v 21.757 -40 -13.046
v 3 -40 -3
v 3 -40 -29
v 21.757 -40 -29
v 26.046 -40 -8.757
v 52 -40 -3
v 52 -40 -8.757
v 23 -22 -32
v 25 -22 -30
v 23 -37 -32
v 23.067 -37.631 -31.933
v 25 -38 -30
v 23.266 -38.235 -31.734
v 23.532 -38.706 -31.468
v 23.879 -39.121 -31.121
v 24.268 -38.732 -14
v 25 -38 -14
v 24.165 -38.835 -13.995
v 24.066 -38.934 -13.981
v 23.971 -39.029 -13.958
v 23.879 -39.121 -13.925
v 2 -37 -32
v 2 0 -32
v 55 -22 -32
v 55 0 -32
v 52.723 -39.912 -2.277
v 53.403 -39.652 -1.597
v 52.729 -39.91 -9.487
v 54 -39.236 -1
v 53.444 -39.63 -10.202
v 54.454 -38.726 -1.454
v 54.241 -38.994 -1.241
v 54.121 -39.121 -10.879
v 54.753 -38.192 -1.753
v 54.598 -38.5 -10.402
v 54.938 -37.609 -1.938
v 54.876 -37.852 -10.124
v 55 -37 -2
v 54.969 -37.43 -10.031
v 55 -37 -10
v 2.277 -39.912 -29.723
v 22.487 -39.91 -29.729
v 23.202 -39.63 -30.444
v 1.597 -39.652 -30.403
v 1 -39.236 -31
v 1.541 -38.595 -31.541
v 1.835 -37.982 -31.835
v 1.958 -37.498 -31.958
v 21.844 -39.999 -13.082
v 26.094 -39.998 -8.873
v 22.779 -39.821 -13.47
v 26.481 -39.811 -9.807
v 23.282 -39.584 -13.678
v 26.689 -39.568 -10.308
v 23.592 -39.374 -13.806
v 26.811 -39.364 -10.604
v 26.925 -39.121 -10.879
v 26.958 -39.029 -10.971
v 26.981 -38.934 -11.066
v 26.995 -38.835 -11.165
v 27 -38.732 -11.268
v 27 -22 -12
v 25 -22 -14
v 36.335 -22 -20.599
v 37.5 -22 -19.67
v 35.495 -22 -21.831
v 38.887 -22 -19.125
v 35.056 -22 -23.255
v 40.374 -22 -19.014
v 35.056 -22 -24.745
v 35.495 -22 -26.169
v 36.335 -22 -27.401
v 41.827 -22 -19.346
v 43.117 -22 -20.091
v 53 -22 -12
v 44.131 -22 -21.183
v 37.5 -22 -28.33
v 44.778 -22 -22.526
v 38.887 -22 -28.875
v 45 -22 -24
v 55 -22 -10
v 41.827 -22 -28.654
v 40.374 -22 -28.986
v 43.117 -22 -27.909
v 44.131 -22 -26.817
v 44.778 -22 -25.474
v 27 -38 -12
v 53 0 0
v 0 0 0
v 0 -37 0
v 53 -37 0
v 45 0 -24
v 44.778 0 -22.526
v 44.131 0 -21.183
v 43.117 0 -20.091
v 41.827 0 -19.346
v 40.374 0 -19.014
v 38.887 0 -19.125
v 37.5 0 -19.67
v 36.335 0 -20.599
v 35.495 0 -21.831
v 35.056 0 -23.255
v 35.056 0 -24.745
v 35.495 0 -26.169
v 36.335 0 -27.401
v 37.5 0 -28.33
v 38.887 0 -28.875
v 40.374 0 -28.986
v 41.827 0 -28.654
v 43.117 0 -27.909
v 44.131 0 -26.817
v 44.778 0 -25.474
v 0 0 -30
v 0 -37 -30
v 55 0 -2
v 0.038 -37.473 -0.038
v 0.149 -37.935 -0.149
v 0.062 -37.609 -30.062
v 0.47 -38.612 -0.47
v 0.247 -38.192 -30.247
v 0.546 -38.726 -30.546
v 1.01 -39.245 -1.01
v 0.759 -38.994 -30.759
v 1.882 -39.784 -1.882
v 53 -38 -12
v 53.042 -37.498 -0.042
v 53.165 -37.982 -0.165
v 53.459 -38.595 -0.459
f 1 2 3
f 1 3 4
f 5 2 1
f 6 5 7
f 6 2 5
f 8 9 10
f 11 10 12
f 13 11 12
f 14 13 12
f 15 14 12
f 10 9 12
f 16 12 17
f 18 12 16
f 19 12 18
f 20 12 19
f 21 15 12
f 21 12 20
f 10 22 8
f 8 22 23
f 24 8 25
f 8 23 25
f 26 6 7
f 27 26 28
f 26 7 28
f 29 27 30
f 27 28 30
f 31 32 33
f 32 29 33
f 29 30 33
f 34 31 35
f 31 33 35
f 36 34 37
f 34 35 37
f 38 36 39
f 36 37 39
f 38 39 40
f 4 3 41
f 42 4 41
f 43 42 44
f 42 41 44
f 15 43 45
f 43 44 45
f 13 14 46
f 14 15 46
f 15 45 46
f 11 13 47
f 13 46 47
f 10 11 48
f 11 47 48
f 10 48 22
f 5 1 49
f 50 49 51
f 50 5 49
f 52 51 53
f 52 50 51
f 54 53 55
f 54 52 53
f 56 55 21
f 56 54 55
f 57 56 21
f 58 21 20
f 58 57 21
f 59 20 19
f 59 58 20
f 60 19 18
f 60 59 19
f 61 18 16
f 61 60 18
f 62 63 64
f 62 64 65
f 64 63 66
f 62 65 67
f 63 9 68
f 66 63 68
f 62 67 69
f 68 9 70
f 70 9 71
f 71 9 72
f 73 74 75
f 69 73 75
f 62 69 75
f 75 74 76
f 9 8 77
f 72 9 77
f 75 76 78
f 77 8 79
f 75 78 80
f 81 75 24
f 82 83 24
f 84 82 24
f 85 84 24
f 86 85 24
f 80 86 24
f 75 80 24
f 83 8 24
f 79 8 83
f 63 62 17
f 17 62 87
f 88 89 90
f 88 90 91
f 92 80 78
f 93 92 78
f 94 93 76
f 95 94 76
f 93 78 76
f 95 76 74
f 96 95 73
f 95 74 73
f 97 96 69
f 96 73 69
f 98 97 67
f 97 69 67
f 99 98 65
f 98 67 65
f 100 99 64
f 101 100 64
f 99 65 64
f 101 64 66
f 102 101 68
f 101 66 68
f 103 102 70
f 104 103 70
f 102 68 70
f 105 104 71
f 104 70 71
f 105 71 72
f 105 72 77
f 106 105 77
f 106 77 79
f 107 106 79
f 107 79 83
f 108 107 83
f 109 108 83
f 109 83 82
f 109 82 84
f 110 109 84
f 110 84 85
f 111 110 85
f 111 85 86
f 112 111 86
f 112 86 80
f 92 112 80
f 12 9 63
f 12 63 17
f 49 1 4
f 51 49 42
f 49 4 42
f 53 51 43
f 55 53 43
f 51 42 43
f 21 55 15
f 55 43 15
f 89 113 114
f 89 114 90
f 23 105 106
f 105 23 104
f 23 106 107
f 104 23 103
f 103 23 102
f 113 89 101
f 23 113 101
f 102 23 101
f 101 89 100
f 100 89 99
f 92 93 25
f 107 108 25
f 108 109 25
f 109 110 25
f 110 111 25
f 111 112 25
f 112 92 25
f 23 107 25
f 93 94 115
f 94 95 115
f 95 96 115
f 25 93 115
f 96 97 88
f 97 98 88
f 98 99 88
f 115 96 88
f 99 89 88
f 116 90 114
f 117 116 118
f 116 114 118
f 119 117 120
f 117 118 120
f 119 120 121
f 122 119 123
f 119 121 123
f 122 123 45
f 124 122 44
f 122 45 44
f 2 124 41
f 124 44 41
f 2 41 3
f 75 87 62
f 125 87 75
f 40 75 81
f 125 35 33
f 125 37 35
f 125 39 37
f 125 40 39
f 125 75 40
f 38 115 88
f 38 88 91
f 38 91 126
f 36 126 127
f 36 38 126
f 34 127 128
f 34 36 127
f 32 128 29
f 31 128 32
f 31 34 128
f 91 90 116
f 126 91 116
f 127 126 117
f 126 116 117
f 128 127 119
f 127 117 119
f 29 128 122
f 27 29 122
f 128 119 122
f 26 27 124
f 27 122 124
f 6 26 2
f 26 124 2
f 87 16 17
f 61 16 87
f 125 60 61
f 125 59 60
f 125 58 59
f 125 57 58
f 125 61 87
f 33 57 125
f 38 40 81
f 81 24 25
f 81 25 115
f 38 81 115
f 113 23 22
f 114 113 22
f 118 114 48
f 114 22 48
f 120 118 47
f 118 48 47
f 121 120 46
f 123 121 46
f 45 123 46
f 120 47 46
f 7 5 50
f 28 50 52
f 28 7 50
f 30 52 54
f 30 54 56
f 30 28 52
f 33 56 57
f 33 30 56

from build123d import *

# Parameters (mm, degrees)
F0_W         = 55
F0_H         = 32
F1_DEPTH     = 40
F2_W         = 30
F2_H         = 18
F3_DEPTH     = 20
F4_R         = 5
F5_DEPTH     = 22.001
F6_SIZE      = 2
F7_T1_DEPTH  = 36
F7_T3_DEPTH  = 45
F7_T5_DEPTH  = 68
F7_T7_DEPTH  = 23
F7_T12_DEPTH = 34.2132034356
F7_T17_DEPTH = 24.2132034356
F7_T22_DEPTH = 13.4214256026
F7_T29_DEPTH = 34.2132034356
F7_T33_DEPTH = 13.4214256026
F7_T40_DEPTH = 13.4214256026
F7_T44_DEPTH = 24.2132034356


# Not quite as in the source:
# - a fillet or chamfer that OpenCascade refuses, or shapes differently, is made with other operations: its cross-section is extruded or revolved along the edge and cut away or added


with BuildPart() as f1:
    # F0 (on Front) → F1 (new body)
    with BuildSketch(Plane.XZ):
        with Locations((27.5, -16)):
            Rectangle(F0_W, F0_H)
    extrude(amount=F1_DEPTH)

    # F2 (on face) → F3 (cut)
    with BuildSketch(Plane(origin=(0, 0, -32), x_dir=(1, 0, 0), z_dir=(0, 0, -1))):
        with Locations((40, 31)):
            Rectangle(F2_W, F2_H)
    extrude(amount=-F3_DEPTH, mode=Mode.SUBTRACT)

    # F4 (on face) → F5 (cut, through all)
    with BuildSketch(Plane.XZ.offset(22)):
        with Locations((40, -24)):
            Circle(F4_R)
    extrude(amount=-F5_DEPTH, mode=Mode.SUBTRACT)

    # F6
    f6_edges = [f1.edges().sort_by_distance(p)[0] for p in [
        (25, -40, -22),
        (25, -31, -32),
        (25, -31, -12),
        (55, -31, -12),
        (40, -40, -12),
        (55, -20, 0),
        (0, -20, -32),
    ]]
    chamfer(f6_edges, length=F6_SIZE)

    # F7: fillet of radius 3 on 7 edges, made by hand

    # F7_s2 → F7_t1 (cut)
    with BuildSketch(Plane.YZ.offset(-5.5)):
        with BuildLine():
            ThreePointArc((-40, -29), (-39.1213203436, -31.1213203436), (-37, -32))
            Line((-37, -32), (-40, -32))
            Line((-40, -32), (-40, -29))
        make_face()
    extrude(amount=F7_T1_DEPTH, mode=Mode.SUBTRACT)

    # F7_s4 → F7_t3 (cut)
    with BuildSketch(Plane.XY.offset(-37.5)):
        with BuildLine():
            ThreePointArc((0, -37), (0.8786796564, -39.1213203436), (3, -40))
            Line((3, -40), (0, -40))
            Line((0, -40), (0, -37))
        make_face()
    extrude(amount=F7_T3_DEPTH, mode=Mode.SUBTRACT)

    # F7_s6 → F7_t5 (cut)
    with BuildSketch(Plane.YZ.offset(-7.5)):
        with BuildLine():
            ThreePointArc((-37, 0), (-39.1213203436, -0.8786796564), (-40, -3))
            Line((-40, -3), (-40, 0))
            Line((-40, 0), (-37, 0))
        make_face()
    extrude(amount=F7_T5_DEPTH, mode=Mode.SUBTRACT)

    # F7_s8 → F7_t7 (cut)
    with BuildSketch(Plane.XY.offset(-17.5)):
        with BuildLine():
            ThreePointArc((52, -40), (54.1213203436, -39.1213203436), (55, -37))
            Line((55, -37), (55, -40))
            Line((55, -40), (52, -40))
        make_face()
    extrude(amount=F7_T7_DEPTH, mode=Mode.SUBTRACT)


with BuildPart() as f7_tool10:
    # F7_s11 → F7_t12 (new body)
    with BuildSketch(Plane.YZ.offset(58.1066017178)):
        with BuildLine():
            ThreePointArc((-40, -8.7573593129), (-39.7716385975, -9.90540961), (-39.1213203436, -10.8786796564))
            Line((-39.1213203436, -10.8786796564), (-40, -10))
            Line((-40, -10), (-40, -8.7573593129))
        make_face()
    extrude(amount=-F7_T12_DEPTH)

    split(bisect_by=Plane(origin=(25.6666666667, -25.6666666667, -25.6666666667), x_dir=(0.7071067812, 0.7071067812, 0), z_dir=(0.5773502692, -0.5773502692, -0.5773502692)), keep=Keep.TOP)


with BuildPart() as f1_1:
    add(f1.part)

    # F7_t9: cut F7_tool10
    add(f7_tool10.part, mode=Mode.SUBTRACT)


with BuildPart() as f7_tool15:
    # F7_s16 → F7_t17 (new body)
    with BuildSketch(Plane.XY.offset(-35.1066017178)):
        with BuildLine():
            ThreePointArc((21.7573593129, -40), (22.90540961, -39.7716385975), (23.8786796564, -39.1213203436))
            Line((23.8786796564, -39.1213203436), (23, -40))
            Line((23, -40), (21.7573593129, -40))
        make_face()
    extrude(amount=F7_T17_DEPTH)

    split(bisect_by=Plane(origin=(25.6666666667, -25.6666666667, -25.6666666667), x_dir=(0.7071067812, 0.7071067812, 0), z_dir=(0.5773502692, -0.5773502692, -0.5773502692)), keep=Keep.TOP)


with BuildPart() as f1_2:
    add(f1_1.part)

    # F7_t14: cut F7_tool15
    add(f7_tool15.part, mode=Mode.SUBTRACT)


with BuildPart() as f7_tool20:
    # F7_s21 → F7_t22 (new body)
    with BuildSketch(Plane(origin=(11.2451905284, 0, 11.2451905284), x_dir=(0, 1, 0), z_dir=(-0.7071067812, 0, -0.7071067812))):
        with BuildLine():
            ThreePointArc((-40, 24.6100366333), (-39.6642215019, 25.9891391634), (-38.7320508076, 27.0595263761))
            Line((-38.7320508076, 27.0595263761), (-40, 26.1629509039))
            Line((-40, 26.1629509039), (-40, 24.6100366333))
        make_face()
    extrude(amount=F7_T22_DEPTH)

    split(bisect_by=Plane(origin=(0, -25, -25), x_dir=(1, 0, 0), z_dir=(0, -0.7071067812, -0.7071067812)), keep=Keep.TOP)

    split(bisect_by=Plane(origin=(31.5, -31.5, 0), x_dir=(0, 0, 1), z_dir=(0.7071067812, -0.7071067812, 0)), keep=Keep.TOP)


with BuildPart() as f1_3:
    add(f1_2.part)

    # F7_t19: cut F7_tool20
    add(f7_tool20.part, mode=Mode.SUBTRACT)


with BuildPart() as f7_tool27:
    # F7_s28 → F7_t29 (new body)
    with BuildSketch(Plane.YZ.offset(58.1066017178)):
        with BuildLine():
            ThreePointArc((-40, -8.7573593129), (-39.7716385975, -9.90540961), (-39.1213203436, -10.8786796564))
            Line((-39.1213203436, -10.8786796564), (-40, -10))
            Line((-40, -10), (-40, -8.7573593129))
        make_face()
    extrude(amount=-F7_T29_DEPTH)

    split(bisect_by=Plane(origin=(25.6666666667, -25.6666666667, -25.6666666667), x_dir=(-0.7071067812, -0.7071067812, 0), z_dir=(-0.5773502692, 0.5773502692, 0.5773502692)), keep=Keep.TOP)


with BuildPart() as f7_tool31:
    # F7_s32 → F7_t33 (new body)
    with BuildSketch(Plane(origin=(11.2451905284, 0, 11.2451905284), x_dir=(0, 1, 0), z_dir=(-0.7071067812, 0, -0.7071067812))):
        with BuildLine():
            ThreePointArc((-40, 24.6100366333), (-39.6642215019, 25.9891391634), (-38.7320508076, 27.0595263761))
            Line((-38.7320508076, 27.0595263761), (-40, 26.1629509039))
            Line((-40, 26.1629509039), (-40, 24.6100366333))
        make_face()
    extrude(amount=F7_T33_DEPTH)

    split(bisect_by=Plane(origin=(0, -25, -25), x_dir=(1, 0, 0), z_dir=(0, 0.7071067812, 0.7071067812)), keep=Keep.TOP)


with BuildPart() as f7_tool27_1:
    add(f7_tool27.part)

    # F7_t35: intersect F7_tool31
    add(f7_tool31.part, mode=Mode.INTERSECT)


with BuildPart() as f1_4:
    add(f1_3.part)

    # F7_t25: cut F7_tool27
    add(f7_tool27_1.part, mode=Mode.SUBTRACT)


with BuildPart() as f7_tool38:
    # F7_s39 → F7_t40 (new body)
    with BuildSketch(Plane(origin=(11.2451905284, 0, 11.2451905284), x_dir=(0, 1, 0), z_dir=(-0.7071067812, 0, -0.7071067812))):
        with BuildLine():
            ThreePointArc((-40, 24.6100366333), (-39.6642215019, 25.9891391634), (-38.7320508076, 27.0595263761))
            Line((-38.7320508076, 27.0595263761), (-40, 26.1629509039))
            Line((-40, 26.1629509039), (-40, 24.6100366333))
        make_face()
    extrude(amount=F7_T40_DEPTH)

    split(bisect_by=Plane(origin=(31.5, -31.5, 0), x_dir=(0, 0, 1), z_dir=(-0.7071067812, 0.7071067812, 0)), keep=Keep.TOP)


with BuildPart() as f7_tool42:
    # F7_s43 → F7_t44 (new body)
    with BuildSketch(Plane.XY.offset(-35.1066017178)):
        with BuildLine():
            ThreePointArc((21.7573593129, -40), (22.90540961, -39.7716385975), (23.8786796564, -39.1213203436))
            Line((23.8786796564, -39.1213203436), (23, -40))
            Line((23, -40), (21.7573593129, -40))
        make_face()
    extrude(amount=F7_T44_DEPTH)

    split(bisect_by=Plane(origin=(25.6666666667, -25.6666666667, -25.6666666667), x_dir=(-0.7071067812, -0.7071067812, 0), z_dir=(-0.5773502692, 0.5773502692, 0.5773502692)), keep=Keep.TOP)


with BuildPart() as f7_tool38_1:
    add(f7_tool38.part)

    # F7_t46: intersect F7_tool42
    add(f7_tool42.part, mode=Mode.INTERSECT)


with BuildPart() as f1_5:
    add(f1_4.part)

    # F7_t36: cut F7_tool38
    add(f7_tool38_1.part, mode=Mode.SUBTRACT)


solid = f1_5.part
